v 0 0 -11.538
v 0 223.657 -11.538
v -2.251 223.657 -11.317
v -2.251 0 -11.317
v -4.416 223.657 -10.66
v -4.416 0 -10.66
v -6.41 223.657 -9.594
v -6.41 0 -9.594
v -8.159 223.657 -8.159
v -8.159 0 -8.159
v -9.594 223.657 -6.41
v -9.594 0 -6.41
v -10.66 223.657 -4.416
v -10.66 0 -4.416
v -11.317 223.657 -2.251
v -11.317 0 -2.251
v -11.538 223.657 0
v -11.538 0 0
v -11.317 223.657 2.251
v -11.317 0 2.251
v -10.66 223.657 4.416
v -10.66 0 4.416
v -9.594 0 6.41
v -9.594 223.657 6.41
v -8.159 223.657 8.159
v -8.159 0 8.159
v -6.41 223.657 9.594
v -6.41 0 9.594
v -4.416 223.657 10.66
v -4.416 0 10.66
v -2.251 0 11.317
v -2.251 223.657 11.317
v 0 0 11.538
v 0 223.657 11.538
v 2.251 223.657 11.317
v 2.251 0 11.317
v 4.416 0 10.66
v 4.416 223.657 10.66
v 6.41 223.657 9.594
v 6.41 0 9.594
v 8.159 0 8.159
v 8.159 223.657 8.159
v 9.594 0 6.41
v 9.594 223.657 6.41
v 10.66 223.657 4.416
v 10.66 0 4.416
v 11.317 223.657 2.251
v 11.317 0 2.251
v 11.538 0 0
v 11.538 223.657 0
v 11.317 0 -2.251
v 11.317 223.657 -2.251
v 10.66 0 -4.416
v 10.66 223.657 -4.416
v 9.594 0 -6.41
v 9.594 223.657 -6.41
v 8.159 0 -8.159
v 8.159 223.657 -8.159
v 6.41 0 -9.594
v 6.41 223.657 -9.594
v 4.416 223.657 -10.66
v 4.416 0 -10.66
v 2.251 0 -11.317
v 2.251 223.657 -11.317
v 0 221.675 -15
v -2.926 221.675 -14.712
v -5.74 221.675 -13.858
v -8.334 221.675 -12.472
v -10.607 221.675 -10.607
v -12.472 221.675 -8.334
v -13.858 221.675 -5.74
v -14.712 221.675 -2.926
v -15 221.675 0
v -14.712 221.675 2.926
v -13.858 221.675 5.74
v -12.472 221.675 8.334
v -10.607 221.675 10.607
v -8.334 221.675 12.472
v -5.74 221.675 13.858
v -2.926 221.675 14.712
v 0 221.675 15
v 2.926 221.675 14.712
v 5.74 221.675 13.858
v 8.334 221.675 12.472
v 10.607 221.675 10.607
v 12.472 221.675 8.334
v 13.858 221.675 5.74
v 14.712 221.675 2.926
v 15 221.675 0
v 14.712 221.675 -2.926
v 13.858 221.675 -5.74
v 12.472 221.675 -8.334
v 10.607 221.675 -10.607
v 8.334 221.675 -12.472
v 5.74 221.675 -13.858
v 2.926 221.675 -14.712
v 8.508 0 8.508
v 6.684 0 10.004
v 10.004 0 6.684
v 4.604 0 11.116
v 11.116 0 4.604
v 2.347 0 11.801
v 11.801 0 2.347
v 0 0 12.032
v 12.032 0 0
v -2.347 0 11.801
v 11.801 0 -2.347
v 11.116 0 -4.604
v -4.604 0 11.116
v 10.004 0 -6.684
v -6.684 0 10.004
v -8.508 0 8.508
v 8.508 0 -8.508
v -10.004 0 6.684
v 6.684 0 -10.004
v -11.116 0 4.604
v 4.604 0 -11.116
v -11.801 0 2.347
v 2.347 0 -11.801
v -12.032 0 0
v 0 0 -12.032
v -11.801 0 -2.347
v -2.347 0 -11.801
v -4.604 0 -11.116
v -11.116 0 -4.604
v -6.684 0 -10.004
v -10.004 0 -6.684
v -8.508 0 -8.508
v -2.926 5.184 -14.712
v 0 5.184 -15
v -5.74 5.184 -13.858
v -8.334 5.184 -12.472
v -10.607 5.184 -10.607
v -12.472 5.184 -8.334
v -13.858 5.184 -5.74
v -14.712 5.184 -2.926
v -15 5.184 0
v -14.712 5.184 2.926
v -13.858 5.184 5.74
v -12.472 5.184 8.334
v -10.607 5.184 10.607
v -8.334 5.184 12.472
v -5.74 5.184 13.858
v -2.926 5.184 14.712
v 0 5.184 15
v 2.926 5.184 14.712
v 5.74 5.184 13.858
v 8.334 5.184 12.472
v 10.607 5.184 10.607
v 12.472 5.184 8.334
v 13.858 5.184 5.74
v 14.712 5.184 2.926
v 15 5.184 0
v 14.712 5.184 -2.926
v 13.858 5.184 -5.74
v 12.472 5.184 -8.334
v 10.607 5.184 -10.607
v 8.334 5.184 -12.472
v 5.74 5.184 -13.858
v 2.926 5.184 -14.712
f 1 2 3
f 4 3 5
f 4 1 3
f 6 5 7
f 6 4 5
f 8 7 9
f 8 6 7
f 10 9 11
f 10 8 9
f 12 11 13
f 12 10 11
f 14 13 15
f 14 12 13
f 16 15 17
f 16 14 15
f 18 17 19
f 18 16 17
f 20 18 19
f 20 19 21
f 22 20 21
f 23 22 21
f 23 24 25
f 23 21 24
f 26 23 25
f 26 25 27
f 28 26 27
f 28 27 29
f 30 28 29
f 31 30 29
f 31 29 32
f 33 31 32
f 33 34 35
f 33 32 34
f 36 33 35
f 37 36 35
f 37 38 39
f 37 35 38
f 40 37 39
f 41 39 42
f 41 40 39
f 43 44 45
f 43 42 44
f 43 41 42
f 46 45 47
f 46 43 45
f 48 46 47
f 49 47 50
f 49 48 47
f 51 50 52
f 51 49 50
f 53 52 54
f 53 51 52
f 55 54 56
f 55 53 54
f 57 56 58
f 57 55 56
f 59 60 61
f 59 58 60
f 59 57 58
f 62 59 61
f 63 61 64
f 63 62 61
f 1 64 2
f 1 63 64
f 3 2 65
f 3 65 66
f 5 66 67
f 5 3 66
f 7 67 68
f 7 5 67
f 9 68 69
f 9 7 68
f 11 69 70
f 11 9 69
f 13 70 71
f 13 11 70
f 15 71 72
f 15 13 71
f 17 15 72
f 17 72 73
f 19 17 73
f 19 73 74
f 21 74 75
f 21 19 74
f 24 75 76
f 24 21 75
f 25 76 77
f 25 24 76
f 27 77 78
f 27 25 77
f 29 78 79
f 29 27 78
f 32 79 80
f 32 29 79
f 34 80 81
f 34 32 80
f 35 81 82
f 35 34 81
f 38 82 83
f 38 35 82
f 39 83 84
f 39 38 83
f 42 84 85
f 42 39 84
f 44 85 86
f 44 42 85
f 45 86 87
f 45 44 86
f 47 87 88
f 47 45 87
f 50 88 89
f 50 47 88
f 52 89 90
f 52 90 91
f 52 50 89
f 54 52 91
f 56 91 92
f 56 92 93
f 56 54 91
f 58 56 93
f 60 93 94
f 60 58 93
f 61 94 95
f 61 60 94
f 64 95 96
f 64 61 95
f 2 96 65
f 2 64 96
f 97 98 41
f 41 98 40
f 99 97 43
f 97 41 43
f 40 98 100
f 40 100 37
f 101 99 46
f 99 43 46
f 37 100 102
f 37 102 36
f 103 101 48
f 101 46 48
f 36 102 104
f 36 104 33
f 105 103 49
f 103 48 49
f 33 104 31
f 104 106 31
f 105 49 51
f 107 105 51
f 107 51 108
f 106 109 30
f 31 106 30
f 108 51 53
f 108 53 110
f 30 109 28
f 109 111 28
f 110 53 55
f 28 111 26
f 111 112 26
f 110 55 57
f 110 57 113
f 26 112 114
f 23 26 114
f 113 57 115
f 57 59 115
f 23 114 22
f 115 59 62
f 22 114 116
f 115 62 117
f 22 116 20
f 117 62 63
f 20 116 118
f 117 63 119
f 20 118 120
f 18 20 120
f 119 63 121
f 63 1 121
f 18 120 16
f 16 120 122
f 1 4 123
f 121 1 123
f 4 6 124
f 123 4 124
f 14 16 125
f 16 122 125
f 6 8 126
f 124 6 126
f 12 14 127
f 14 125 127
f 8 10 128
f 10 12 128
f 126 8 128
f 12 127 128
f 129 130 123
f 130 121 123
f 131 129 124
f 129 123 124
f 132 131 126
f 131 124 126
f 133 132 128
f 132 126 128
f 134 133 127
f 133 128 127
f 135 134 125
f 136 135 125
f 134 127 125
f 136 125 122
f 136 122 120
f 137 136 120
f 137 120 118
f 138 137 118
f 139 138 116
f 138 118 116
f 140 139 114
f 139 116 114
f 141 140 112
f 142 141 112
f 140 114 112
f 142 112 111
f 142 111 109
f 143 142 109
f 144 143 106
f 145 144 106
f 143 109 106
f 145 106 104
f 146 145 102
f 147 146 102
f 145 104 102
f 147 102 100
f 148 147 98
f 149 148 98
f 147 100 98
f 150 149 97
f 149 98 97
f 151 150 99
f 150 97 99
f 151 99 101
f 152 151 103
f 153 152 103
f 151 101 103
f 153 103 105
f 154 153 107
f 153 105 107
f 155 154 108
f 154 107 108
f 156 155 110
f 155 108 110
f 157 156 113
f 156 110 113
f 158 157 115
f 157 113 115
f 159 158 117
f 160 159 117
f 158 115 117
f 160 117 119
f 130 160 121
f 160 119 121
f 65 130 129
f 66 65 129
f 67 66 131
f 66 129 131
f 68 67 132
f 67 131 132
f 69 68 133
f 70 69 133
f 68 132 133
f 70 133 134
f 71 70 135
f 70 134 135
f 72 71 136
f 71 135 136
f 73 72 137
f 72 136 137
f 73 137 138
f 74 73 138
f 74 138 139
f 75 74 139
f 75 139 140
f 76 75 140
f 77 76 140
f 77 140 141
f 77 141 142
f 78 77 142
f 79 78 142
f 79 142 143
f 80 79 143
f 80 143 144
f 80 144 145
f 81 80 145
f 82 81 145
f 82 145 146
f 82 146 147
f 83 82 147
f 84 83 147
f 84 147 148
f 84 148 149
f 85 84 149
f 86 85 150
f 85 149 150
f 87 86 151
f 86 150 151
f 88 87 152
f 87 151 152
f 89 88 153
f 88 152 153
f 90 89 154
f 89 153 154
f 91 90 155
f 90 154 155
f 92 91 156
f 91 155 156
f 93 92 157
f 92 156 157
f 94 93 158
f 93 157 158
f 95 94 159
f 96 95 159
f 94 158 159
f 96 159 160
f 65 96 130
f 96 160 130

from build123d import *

# Parameters (mm, degrees)
SKETCH1_R           = 15
BOSS_EXTRUDE1_DEPTH = 224.642859
SKETCH2_R           = 11.538325124
CUT_EXTRUDE1_DEPTH  = 226.642225879
CHAMFER1_SIZE       = 2.968248
CHAMFER1_SIZE_2     = 5.183772


with BuildPart() as part:
    # Sketch1 → Boss-Extrude1 (new body)
    with BuildSketch(Plane(origin=(0, 0, 0), x_dir=(1, 0, 0), z_dir=(0, 1, 0))):
        with Locations(Location((0, 0, 0), (0, 0, 90))):
            Circle(SKETCH1_R)
    extrude(amount=BOSS_EXTRUDE1_DEPTH)

    # Sketch2 → Cut-Extrude1 (cut, through all)
    with BuildSketch(Plane(origin=(0, 0, 0), x_dir=(1, 0, 0), z_dir=(0, 1, 0))):
        with Locations(Location((0, 0, 0), (0, 0, 90))):
            Circle(SKETCH2_R)
    extrude(amount=CUT_EXTRUDE1_DEPTH, mode=Mode.SUBTRACT)

    # Chamfer1
    # the kernel refuses this chamfer: 5.183772, 2.968248 mm, written as the material it takes off along each edge
    with BuildSketch(Plane(origin=(0, 224.642859, 0), x_dir=(0, 0, -1), z_dir=(1, 0, 0))) as chamfer1_piece_1:
        Polygon((15, -CHAMFER1_SIZE), (15 - CHAMFER1_SIZE_2, 0), (15, 0), align=None)
    revolve(axis=Axis((0, 224.642859, 0), (0, 1, 0)), mode=Mode.SUBTRACT)
    with BuildSketch(Plane(origin=(0, 0, 0), x_dir=(0, 0, -1), z_dir=(1, 0, 0))) as chamfer1_piece_2:
        Polygon((15, CHAMFER1_SIZE_2), (15 - CHAMFER1_SIZE, 0), (15, 0), align=None)
    revolve(axis=Axis((0, 0, 0), (0, 1, 0)), mode=Mode.SUBTRACT)


solid = part.part
